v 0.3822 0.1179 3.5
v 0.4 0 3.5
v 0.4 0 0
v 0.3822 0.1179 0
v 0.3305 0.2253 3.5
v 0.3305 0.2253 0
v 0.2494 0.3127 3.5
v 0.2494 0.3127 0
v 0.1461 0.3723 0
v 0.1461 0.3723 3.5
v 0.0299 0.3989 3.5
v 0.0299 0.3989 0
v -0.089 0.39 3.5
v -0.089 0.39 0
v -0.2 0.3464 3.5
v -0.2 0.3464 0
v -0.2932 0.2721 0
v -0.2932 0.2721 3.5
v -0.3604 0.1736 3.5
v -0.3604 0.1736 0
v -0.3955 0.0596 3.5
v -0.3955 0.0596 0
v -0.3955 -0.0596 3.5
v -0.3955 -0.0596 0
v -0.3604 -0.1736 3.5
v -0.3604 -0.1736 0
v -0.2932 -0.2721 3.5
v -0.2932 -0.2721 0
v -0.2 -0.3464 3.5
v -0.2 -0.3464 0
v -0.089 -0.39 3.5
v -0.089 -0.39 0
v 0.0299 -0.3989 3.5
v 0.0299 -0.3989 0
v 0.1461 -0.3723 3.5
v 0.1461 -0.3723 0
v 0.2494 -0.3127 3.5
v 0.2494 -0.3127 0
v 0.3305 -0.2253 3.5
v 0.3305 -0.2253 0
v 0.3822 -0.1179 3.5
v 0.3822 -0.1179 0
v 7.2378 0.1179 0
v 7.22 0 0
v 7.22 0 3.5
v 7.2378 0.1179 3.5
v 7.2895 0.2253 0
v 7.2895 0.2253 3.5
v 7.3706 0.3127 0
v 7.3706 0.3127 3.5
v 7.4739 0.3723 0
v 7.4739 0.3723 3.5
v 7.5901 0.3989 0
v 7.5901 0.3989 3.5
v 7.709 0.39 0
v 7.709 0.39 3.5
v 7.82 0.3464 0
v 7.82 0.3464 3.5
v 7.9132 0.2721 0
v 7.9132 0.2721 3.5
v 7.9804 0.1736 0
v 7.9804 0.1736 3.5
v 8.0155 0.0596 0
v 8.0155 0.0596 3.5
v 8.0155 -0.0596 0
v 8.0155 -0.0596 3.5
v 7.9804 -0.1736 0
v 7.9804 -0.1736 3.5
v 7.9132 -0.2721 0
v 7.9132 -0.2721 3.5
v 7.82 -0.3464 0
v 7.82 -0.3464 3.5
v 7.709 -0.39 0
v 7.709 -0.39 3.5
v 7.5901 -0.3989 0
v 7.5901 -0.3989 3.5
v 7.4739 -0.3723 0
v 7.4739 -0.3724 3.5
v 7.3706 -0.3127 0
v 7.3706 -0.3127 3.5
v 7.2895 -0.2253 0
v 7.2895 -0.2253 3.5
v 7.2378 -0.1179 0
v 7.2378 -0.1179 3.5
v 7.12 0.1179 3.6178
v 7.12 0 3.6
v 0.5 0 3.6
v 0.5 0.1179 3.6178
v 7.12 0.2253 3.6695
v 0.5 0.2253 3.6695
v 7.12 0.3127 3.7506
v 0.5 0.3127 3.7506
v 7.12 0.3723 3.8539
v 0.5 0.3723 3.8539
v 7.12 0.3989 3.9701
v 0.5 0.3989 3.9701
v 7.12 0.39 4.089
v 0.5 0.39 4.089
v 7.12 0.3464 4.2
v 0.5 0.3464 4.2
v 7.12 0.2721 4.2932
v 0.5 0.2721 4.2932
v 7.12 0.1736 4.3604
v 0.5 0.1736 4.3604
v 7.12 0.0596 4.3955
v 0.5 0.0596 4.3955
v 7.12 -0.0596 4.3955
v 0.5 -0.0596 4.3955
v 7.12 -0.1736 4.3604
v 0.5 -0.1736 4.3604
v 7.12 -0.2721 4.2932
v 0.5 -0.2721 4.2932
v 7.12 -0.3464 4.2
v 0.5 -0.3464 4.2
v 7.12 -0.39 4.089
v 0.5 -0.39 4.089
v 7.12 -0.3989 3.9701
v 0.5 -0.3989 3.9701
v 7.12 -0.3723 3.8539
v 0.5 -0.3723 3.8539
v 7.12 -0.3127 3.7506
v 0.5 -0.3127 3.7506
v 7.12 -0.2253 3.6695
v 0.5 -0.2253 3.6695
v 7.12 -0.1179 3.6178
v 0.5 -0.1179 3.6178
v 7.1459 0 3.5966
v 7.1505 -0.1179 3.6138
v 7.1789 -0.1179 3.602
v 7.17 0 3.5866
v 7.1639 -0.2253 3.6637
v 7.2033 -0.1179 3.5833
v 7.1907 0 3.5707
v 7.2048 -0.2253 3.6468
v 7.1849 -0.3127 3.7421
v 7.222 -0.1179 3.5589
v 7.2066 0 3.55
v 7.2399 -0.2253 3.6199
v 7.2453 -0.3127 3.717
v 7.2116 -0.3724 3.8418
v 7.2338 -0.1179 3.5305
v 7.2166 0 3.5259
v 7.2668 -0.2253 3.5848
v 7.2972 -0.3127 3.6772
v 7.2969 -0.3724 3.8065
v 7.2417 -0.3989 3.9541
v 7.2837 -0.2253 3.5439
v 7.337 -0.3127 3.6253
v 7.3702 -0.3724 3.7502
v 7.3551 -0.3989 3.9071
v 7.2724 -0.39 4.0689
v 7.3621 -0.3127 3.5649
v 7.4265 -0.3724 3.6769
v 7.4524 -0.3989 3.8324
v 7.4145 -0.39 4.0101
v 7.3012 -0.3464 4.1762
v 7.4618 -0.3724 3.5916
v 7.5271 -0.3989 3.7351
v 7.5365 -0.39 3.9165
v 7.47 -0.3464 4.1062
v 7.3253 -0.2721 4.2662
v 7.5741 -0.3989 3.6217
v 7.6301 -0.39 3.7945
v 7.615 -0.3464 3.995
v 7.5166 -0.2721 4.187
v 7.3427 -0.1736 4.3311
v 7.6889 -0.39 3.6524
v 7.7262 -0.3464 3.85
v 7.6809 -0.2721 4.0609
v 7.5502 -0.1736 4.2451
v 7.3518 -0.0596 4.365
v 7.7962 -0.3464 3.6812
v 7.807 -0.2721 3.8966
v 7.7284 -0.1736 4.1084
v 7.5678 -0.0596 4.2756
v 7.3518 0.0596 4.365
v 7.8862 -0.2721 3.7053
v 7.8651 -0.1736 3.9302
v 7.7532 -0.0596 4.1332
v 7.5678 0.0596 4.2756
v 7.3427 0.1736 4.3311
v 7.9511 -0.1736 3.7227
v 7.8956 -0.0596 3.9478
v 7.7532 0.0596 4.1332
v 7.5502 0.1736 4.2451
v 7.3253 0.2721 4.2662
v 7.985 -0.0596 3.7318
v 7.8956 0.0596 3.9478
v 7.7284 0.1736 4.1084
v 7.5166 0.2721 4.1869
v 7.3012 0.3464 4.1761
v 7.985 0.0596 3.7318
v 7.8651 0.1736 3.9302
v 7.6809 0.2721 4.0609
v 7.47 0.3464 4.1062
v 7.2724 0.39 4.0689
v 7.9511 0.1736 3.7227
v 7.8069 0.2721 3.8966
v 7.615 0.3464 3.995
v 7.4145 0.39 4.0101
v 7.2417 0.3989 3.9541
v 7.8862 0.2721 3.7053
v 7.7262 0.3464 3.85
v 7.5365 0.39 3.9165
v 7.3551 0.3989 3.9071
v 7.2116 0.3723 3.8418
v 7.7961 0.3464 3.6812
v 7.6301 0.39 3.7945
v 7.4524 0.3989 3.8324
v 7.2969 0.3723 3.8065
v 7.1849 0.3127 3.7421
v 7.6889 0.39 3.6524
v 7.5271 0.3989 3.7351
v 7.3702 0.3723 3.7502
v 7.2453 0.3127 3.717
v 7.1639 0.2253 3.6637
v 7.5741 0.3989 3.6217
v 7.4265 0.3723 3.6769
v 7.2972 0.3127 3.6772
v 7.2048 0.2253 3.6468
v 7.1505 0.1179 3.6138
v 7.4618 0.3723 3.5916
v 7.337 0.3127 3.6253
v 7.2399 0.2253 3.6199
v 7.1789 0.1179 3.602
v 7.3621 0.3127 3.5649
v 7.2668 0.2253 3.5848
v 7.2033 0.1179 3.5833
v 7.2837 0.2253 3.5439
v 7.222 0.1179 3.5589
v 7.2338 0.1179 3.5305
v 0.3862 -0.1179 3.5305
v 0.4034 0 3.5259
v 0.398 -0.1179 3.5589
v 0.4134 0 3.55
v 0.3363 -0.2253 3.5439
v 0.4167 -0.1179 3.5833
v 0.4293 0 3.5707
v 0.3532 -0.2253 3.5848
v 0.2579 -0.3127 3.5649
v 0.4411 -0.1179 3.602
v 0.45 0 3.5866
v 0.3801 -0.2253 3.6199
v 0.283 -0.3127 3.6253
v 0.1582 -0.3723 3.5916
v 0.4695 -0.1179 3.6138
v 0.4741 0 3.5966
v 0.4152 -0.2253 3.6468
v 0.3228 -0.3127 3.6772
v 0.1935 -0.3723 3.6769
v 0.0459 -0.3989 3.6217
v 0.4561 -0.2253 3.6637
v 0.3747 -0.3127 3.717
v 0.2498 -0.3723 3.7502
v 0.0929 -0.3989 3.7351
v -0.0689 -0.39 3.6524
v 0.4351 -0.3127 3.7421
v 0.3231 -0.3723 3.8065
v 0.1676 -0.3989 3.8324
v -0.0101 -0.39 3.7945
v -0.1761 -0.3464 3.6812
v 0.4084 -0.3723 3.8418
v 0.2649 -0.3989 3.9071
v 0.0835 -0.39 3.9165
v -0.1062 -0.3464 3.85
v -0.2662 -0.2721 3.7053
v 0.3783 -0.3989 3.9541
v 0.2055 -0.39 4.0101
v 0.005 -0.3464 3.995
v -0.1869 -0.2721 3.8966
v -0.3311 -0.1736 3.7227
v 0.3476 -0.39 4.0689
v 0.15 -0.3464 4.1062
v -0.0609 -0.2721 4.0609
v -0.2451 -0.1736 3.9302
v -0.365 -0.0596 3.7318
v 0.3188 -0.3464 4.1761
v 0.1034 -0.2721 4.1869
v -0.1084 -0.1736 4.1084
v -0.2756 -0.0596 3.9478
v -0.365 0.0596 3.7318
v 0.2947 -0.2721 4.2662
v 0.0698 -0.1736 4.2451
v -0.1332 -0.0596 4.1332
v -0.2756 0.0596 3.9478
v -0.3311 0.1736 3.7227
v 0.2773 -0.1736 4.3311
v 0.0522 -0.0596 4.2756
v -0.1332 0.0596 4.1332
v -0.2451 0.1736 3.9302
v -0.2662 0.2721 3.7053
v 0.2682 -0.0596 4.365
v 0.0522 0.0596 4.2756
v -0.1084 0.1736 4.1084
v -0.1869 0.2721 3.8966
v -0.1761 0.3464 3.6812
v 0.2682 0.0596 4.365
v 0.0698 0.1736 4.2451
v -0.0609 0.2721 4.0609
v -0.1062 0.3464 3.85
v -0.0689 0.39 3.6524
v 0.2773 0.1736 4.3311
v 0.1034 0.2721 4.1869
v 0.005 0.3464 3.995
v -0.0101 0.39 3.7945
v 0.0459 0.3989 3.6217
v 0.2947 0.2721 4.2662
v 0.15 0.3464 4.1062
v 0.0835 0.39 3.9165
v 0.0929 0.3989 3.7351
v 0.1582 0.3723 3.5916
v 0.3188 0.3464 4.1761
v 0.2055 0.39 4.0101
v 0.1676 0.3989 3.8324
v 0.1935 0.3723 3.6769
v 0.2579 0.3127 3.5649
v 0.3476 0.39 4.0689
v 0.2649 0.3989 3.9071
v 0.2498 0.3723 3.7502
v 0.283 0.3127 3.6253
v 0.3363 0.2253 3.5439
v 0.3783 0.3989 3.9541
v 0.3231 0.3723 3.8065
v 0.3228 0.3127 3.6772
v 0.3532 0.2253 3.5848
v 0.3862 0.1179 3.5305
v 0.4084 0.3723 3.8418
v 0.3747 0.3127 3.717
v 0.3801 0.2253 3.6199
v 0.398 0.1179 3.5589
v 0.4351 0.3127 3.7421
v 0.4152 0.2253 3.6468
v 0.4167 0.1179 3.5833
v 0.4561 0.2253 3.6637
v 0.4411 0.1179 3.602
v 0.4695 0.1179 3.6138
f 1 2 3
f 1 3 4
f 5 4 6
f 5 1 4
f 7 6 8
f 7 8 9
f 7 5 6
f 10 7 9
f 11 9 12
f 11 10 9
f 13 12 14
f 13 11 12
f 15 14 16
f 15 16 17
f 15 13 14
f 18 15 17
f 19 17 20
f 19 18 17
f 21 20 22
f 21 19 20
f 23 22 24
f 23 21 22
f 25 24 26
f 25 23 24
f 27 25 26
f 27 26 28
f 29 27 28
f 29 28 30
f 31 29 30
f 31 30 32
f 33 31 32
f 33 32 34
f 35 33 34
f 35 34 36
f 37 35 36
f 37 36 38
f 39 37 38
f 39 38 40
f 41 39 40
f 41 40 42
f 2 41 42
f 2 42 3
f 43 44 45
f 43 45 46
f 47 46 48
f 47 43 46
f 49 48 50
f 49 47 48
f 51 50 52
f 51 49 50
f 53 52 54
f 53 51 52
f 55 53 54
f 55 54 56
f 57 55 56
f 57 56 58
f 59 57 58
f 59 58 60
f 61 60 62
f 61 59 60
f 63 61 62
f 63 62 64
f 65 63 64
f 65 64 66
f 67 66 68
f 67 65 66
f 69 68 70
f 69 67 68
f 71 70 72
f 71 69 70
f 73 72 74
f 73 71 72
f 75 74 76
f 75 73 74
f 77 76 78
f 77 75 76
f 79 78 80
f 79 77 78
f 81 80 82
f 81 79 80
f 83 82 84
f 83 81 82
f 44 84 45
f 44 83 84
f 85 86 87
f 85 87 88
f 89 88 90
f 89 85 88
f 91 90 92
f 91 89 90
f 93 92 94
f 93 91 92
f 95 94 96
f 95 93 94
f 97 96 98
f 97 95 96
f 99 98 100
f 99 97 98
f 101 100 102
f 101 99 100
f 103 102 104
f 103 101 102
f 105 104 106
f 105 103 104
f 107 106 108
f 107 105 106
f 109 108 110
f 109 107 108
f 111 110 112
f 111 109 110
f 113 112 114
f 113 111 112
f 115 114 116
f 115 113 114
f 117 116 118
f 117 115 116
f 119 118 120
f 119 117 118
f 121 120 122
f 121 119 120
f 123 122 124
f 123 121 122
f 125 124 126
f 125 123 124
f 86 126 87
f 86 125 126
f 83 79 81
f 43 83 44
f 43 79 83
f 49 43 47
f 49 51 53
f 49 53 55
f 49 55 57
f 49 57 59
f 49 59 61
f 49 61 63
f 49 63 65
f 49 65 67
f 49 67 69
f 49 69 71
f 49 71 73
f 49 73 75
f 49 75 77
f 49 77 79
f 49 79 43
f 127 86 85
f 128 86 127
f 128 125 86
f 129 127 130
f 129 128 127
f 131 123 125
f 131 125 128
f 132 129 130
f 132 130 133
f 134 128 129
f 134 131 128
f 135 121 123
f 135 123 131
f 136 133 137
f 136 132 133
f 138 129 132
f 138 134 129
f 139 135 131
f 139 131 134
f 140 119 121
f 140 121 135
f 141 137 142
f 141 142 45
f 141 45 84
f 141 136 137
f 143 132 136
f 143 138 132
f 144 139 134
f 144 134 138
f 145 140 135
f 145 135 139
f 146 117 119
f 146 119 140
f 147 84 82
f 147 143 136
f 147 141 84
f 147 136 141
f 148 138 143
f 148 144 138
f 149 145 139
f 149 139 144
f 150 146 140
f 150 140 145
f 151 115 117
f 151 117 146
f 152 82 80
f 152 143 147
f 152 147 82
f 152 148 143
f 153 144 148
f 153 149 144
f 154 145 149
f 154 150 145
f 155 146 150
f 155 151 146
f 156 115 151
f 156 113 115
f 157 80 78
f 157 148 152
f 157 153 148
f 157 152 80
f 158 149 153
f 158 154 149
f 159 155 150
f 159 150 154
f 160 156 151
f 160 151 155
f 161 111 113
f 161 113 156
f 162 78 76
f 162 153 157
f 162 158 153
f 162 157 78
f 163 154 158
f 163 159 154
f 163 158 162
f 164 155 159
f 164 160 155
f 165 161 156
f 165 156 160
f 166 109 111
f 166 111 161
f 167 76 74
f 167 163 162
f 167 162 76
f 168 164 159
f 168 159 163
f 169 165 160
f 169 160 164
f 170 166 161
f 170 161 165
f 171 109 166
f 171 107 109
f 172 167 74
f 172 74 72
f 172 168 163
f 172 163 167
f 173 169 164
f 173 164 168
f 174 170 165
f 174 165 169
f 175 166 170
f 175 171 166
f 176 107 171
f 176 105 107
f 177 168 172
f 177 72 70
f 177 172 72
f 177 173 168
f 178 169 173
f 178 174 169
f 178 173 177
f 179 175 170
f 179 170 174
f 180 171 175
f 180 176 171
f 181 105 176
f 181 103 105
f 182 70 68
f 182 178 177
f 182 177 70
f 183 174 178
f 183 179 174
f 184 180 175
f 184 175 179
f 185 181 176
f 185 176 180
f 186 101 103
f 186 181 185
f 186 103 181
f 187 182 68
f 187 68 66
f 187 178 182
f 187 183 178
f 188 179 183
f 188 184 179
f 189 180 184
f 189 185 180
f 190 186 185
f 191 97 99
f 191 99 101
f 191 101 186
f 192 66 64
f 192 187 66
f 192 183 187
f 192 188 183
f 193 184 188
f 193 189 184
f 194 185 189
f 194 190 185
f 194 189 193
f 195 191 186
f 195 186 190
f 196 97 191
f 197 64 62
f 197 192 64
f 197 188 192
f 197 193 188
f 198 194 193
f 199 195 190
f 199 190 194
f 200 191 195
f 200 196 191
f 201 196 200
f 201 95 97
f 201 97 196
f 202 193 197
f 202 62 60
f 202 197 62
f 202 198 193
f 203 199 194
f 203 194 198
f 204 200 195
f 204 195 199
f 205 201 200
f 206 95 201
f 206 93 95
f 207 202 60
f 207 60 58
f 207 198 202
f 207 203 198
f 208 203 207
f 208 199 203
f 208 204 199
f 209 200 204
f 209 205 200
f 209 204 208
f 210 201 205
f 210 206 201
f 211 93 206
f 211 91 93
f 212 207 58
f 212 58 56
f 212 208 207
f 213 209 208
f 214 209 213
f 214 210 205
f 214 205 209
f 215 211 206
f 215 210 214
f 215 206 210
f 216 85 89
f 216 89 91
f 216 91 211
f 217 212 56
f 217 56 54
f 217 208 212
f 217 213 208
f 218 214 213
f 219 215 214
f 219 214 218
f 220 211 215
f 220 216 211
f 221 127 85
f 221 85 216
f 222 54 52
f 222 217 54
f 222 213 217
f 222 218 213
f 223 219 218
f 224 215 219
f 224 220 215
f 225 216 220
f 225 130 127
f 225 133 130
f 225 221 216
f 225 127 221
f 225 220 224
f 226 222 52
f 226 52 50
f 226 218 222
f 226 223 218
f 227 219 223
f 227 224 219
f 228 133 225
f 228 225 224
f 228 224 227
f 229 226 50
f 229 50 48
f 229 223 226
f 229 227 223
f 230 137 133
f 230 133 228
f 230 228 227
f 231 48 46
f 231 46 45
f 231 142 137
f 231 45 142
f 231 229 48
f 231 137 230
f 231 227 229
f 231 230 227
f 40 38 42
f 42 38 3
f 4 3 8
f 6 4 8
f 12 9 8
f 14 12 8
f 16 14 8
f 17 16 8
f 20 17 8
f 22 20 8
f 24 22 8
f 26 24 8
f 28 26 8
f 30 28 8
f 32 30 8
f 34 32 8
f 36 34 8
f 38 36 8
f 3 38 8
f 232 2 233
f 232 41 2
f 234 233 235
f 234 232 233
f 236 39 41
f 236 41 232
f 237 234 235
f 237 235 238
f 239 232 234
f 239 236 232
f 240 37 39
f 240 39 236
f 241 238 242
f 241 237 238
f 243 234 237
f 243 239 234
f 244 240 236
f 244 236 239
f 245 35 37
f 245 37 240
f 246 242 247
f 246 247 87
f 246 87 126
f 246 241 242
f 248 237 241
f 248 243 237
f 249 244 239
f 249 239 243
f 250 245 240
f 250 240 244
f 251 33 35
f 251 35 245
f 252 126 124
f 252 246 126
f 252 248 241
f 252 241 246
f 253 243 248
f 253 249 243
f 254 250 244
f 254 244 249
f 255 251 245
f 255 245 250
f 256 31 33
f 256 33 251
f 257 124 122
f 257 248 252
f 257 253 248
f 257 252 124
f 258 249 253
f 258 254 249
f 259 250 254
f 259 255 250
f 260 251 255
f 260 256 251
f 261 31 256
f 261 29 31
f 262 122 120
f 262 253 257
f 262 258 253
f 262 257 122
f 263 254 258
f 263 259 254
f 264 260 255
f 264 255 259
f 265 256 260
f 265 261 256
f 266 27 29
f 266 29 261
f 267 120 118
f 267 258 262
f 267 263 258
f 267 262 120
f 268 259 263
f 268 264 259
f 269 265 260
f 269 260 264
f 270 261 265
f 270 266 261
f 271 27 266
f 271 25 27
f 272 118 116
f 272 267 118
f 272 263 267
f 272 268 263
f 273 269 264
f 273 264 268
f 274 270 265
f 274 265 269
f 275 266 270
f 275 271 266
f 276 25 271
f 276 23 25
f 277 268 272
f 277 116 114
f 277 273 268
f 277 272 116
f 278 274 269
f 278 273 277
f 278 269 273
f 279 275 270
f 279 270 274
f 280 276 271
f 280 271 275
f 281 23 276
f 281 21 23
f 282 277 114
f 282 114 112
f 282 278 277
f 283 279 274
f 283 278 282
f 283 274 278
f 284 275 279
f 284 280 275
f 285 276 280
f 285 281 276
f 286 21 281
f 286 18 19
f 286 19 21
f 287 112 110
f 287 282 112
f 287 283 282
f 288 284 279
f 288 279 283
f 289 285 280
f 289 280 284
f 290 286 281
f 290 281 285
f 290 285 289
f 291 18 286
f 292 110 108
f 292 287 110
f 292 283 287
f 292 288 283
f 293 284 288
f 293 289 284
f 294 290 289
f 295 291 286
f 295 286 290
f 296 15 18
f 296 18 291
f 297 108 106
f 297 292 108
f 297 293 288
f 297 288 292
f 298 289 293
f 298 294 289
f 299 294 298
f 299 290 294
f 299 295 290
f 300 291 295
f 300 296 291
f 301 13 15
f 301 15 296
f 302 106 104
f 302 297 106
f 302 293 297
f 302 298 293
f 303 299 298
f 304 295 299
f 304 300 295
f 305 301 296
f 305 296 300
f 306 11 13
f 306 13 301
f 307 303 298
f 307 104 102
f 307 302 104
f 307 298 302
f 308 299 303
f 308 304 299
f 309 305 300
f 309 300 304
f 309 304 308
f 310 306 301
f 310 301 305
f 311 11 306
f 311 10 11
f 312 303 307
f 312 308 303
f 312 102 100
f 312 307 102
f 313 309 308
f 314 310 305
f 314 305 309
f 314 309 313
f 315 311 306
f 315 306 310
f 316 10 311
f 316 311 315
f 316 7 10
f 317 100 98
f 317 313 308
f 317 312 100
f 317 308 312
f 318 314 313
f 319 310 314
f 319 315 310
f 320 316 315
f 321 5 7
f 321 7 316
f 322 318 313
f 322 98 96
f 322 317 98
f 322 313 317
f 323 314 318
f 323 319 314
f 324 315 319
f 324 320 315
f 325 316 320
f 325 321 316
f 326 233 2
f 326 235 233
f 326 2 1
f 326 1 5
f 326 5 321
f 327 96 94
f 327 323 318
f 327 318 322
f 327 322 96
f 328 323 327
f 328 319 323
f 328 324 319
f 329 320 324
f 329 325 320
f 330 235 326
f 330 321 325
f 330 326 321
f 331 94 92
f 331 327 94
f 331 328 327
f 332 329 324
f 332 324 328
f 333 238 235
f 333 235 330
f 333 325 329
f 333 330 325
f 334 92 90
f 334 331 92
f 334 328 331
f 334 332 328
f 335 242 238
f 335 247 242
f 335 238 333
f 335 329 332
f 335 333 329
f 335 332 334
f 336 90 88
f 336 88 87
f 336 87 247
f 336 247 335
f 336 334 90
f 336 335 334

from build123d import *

# Parameters (mm, degrees)
SKETCH_R = 0.4


with BuildPart() as part:
    # AdditivePipe: sweep along a path in Sketch001
    with BuildLine(Plane.XZ) as additivepipe_path:
        Line((0, 0), (0, 3.5))
        ThreePointArc((0, 3.5), (0.146447, 3.853553), (0.5, 4))
        Line((0.5, 4), (7.12, 4))
        ThreePointArc((7.12, 4), (7.473553, 3.853553), (7.62, 3.5))
        Line((7.62, 3.5), (7.62, 0))
    # Sketch → AdditivePipe (sweep)
    with BuildSketch(Plane.XY):
        Circle(SKETCH_R)
    sweep(path=additivepipe_path.line)


solid = part.part
